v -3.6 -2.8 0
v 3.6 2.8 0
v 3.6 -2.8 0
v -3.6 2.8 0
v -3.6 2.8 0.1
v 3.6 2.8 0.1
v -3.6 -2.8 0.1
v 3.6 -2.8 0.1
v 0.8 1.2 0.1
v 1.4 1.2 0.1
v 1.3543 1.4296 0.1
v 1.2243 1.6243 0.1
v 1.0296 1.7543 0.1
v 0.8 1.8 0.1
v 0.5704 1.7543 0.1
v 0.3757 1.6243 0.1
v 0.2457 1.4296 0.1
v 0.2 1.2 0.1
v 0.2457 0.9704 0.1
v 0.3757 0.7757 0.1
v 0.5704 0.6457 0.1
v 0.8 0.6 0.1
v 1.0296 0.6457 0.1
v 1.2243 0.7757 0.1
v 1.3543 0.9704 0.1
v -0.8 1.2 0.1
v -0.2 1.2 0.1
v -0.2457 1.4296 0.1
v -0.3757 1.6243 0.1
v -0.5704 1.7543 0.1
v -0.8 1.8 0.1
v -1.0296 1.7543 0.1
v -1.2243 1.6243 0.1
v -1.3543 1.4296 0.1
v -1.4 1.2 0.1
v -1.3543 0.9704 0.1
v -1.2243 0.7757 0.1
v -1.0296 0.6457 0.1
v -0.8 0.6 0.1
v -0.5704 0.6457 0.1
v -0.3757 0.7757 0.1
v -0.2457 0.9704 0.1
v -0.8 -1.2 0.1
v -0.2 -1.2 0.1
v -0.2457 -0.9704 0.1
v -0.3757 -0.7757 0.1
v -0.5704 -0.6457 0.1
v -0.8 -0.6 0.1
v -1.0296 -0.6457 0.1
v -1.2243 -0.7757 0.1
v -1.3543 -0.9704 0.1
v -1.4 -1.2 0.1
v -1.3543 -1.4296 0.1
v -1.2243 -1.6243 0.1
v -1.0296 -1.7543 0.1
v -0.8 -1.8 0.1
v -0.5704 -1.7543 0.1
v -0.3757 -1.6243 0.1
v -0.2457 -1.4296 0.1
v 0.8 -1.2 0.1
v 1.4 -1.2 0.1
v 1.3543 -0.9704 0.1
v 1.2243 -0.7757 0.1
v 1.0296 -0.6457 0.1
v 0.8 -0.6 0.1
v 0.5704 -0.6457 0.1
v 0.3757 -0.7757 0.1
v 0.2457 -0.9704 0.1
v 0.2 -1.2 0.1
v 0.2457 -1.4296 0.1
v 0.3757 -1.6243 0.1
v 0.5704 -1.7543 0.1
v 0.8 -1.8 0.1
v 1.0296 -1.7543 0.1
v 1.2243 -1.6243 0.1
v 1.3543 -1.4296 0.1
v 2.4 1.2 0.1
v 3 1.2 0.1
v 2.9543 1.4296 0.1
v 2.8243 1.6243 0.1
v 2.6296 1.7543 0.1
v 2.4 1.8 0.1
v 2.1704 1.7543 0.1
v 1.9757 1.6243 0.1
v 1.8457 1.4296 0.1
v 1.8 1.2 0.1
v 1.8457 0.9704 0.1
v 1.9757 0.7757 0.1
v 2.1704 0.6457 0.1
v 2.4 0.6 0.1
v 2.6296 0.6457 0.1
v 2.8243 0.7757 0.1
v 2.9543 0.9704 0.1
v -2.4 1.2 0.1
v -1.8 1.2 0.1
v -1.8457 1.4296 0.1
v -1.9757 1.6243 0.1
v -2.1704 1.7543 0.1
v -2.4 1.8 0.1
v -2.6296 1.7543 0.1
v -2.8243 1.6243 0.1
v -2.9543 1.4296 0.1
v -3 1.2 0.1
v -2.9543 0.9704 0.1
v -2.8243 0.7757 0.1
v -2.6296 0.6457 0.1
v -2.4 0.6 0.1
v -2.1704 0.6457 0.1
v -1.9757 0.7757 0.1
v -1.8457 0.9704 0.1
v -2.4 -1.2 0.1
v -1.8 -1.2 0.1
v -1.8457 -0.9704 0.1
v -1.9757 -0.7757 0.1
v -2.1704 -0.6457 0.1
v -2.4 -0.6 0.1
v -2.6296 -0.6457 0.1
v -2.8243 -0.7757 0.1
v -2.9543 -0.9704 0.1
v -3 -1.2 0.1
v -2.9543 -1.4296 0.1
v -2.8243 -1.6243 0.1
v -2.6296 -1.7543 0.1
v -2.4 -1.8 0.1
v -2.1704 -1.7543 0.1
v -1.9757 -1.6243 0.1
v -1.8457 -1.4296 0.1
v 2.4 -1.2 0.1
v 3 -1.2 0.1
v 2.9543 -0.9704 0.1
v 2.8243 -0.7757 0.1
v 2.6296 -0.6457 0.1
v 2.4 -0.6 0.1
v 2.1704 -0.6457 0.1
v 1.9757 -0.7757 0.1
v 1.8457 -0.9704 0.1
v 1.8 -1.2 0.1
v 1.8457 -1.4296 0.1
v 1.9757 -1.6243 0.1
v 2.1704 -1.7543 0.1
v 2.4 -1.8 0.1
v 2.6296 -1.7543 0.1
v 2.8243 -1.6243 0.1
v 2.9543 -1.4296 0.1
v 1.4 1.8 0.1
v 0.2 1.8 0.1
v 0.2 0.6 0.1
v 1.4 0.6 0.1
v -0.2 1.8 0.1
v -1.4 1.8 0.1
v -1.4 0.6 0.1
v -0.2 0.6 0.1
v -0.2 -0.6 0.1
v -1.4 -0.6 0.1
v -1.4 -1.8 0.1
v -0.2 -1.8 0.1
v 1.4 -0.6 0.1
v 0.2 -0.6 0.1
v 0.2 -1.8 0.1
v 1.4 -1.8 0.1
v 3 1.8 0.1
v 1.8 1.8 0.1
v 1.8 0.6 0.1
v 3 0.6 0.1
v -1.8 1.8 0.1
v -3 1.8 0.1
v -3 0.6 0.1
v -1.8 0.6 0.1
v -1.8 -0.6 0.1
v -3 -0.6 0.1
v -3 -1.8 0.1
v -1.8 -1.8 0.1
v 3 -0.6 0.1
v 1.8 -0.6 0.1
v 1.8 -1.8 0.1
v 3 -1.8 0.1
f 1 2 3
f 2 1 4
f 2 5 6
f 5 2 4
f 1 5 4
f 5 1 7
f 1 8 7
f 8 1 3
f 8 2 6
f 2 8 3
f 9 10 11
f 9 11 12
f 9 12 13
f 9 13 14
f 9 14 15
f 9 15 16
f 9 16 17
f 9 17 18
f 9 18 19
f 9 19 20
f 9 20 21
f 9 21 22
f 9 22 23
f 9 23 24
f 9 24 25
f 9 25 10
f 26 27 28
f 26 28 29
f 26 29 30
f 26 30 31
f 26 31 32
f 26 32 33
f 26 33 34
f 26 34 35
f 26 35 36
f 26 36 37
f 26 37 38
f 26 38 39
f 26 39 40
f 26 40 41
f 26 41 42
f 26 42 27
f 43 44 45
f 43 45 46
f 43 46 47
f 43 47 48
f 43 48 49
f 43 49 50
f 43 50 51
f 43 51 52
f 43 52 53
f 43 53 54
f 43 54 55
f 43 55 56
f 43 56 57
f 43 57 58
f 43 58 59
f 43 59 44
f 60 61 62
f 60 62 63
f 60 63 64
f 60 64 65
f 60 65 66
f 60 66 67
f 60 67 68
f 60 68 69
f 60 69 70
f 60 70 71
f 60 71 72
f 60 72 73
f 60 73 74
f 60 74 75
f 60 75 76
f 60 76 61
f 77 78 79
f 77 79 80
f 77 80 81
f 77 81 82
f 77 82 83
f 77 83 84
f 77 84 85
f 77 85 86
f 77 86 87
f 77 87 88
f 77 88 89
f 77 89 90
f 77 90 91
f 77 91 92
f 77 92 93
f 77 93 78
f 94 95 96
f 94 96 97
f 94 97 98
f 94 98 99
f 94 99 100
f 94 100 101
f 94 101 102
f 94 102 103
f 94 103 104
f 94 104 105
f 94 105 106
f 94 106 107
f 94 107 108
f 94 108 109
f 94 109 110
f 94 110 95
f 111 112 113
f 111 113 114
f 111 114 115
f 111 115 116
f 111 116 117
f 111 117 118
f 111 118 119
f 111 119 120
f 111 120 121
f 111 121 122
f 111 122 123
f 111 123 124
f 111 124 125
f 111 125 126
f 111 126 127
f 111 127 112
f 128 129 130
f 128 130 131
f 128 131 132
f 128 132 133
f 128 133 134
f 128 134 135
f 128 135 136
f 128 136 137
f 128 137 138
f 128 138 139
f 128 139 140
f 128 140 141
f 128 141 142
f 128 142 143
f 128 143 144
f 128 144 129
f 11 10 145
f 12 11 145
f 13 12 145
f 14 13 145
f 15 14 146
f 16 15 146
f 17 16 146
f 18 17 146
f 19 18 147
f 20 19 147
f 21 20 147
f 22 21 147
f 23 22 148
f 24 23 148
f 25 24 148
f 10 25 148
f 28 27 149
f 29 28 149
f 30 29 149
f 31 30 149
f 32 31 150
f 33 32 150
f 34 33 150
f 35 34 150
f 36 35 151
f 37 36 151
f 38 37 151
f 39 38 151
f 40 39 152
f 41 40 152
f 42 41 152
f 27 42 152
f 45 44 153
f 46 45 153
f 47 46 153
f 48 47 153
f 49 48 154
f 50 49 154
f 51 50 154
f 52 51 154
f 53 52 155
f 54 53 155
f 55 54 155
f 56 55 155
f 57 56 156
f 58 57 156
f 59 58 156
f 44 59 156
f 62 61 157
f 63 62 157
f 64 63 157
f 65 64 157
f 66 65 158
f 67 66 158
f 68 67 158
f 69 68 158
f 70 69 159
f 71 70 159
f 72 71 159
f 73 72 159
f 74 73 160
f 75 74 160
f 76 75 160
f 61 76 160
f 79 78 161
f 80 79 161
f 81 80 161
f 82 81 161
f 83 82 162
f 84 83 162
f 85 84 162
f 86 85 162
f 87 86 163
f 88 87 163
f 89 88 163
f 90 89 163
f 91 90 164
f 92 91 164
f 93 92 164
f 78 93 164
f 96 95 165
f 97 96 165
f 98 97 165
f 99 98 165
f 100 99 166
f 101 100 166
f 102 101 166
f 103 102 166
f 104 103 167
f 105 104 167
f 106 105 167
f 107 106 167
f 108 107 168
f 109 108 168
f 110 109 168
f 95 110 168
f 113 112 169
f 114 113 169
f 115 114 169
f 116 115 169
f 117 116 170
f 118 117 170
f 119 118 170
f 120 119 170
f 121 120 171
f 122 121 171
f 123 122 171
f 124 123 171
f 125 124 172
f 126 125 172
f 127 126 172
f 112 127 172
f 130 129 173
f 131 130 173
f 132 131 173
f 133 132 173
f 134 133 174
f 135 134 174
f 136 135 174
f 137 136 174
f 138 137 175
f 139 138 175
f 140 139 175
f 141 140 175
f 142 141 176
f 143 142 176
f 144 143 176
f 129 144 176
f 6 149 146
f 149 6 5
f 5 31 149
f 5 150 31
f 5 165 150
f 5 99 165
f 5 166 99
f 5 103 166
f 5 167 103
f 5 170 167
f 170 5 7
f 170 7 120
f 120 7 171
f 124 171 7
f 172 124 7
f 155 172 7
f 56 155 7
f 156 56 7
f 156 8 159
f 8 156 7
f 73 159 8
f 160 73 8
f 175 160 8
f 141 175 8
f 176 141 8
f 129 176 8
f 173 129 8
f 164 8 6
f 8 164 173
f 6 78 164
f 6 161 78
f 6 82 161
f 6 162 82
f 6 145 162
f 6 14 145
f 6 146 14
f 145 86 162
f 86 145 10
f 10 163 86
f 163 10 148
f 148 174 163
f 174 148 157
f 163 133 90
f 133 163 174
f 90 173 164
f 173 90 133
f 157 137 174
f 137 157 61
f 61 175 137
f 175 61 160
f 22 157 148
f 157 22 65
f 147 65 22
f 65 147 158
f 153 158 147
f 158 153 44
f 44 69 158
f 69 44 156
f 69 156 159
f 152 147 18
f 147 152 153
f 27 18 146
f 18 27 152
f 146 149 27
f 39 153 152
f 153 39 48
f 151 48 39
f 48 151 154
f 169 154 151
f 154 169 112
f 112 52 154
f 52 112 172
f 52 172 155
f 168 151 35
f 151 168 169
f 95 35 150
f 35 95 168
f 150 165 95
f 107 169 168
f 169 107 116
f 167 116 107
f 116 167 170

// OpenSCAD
// file: ../p/box5-12.scad
use <../lib.scad>
function ldraw_lib__box5_12() = [
// 0 Box with 5 Faces without Any Edges
// 0 Name: box5-12.dat
// 0 Author: Chris Dee [cwdee]
// 0 !LDRAW_ORG Primitive UPDATE 2009-02
// 0 !LICENSE Licensed under CC BY 4.0 : see CAreadme.txt
// 
// 0 BFC CERTIFY CCW
  [0,"BFC","CERTIFY"],
  [0,"BFC","CCW"],
// 
// 0 !HISTORY 2009-09-03 [PTadmin] Official Update 2009-02
// 
// 
// 4 16 1 1 1 1 1 -1 -1 1 -1 -1 1 1
  [4,16,1,1,1,1,1,-1,-1,1,-1,-1,1,1],
// 4 16 -1 0 1 1 0 1 1 1 1 -1 1 1
  [4,16,-1,0,1,1,0,1,1,1,1,-1,1,1],
// 4 16 -1 0 -1 -1 0 1 -1 1 1 -1 1 -1
  [4,16,-1,0,-1,-1,0,1,-1,1,1,-1,1,-1],
// 4 16 1 0 -1 -1 0 -1 -1 1 -1 1 1 -1
  [4,16,1,0,-1,-1,0,-1,-1,1,-1,1,1,-1],
// 4 16 1 0 1 1 0 -1 1 1 -1 1 1 1
  [4,16,1,0,1,1,0,-1,1,1,-1,1,1,1],
// 0
];
module ldraw_lib__box5_12(step=0, col=false, unit=2/5, alt=false, line=0.2, solid=!$preview)
    makepoly(ldraw_lib__box5_12(), step=step, col=col, unit=unit, alt=alt, line=line, solid=solid);
ldraw_lib__box5_12(line=0.2);
// file: ../p/4-4ndis.scad
use <../lib.scad>
function ldraw_lib__4_4ndis() = [
// 0 Disc Negative 1.0
// 0 Name: 4-4ndis.dat
// 0 Author: James Jessiman
// 0 !LDRAW_ORG Primitive UPDATE 2012-01
// 0 !LICENSE Licensed under CC BY 4.0 : see CAreadme.txt
// 
// 0 BFC CERTIFY CCW
  [0,"BFC","CERTIFY"],
  [0,"BFC","CCW"],
// 
// 0 !HISTORY 2002-03-23 [sbliss] Added BFC statement; compacted code
// 0 !HISTORY 2002-04-25 [PTadmin] Official Update 2002-02
// 0 !HISTORY 2007-06-24 [PTadmin] Header formatted for Contributor Agreement
// 0 !HISTORY 2008-07-01 [PTadmin] Official Update 2008-01
// 0 !HISTORY 2012-02-16 [Philo] Changed to CCW
// 0 !HISTORY 2012-03-30 [PTadmin] Official Update 2012-01
// 
// 
// 3 16 0.9239 0 0.3827 1 0 0 1 0 1
  [3,16,0.9239,0,0.3827,1,0,0,1,0,1],
// 3 16 0.7071 0 0.7071 0.9239 0 0.3827 1 0 1
  [3,16,0.7071,0,0.7071,0.9239,0,0.3827,1,0,1],
// 3 16 0.3827 0 0.9239 0.7071 0 0.7071 1 0 1
  [3,16,0.3827,0,0.9239,0.7071,0,0.7071,1,0,1],
// 3 16 0 0 1 0.3827 0 0.9239 1 0 1
  [3,16,0,0,1,0.3827,0,0.9239,1,0,1],
// 3 16 -0.3827 0 0.9239 0 0 1 -1 0 1
  [3,16,-0.3827,0,0.9239,0,0,1,-1,0,1],
// 3 16 -0.7071 0 0.7071 -0.3827 0 0.9239 -1 0 1
  [3,16,-0.7071,0,0.7071,-0.3827,0,0.9239,-1,0,1],
// 3 16 -0.9239 0 0.3827 -0.7071 0 0.7071 -1 0 1
  [3,16,-0.9239,0,0.3827,-0.7071,0,0.7071,-1,0,1],
// 3 16 -1 0 0 -0.9239 0 0.3827 -1 0 1
  [3,16,-1,0,0,-0.9239,0,0.3827,-1,0,1],
// 3 16 -0.9239 0 -0.3827 -1 0 0 -1 0 -1
  [3,16,-0.9239,0,-0.3827,-1,0,0,-1,0,-1],
// 3 16 -0.7071 0 -0.7071 -0.9239 0 -0.3827 -1 0 -1
  [3,16,-0.7071,0,-0.7071,-0.9239,0,-0.3827,-1,0,-1],
// 3 16 -0.3827 0 -0.9239 -0.7071 0 -0.7071 -1 0 -1
  [3,16,-0.3827,0,-0.9239,-0.7071,0,-0.7071,-1,0,-1],
// 3 16 0 0 -1 -0.3827 0 -0.9239 -1 0 -1
  [3,16,0,0,-1,-0.3827,0,-0.9239,-1,0,-1],
// 3 16 0.3827 0 -0.9239 0 0 -1 1 0 -1
  [3,16,0.3827,0,-0.9239,0,0,-1,1,0,-1],
// 3 16 0.7071 0 -0.7071 0.3827 0 -0.9239 1 0 -1
  [3,16,0.7071,0,-0.7071,0.3827,0,-0.9239,1,0,-1],
// 3 16 0.9239 0 -0.3827 0.7071 0 -0.7071 1 0 -1
  [3,16,0.9239,0,-0.3827,0.7071,0,-0.7071,1,0,-1],
// 3 16 1 0 0 0.9239 0 -0.3827 1 0 -1
  [3,16,1,0,0,0.9239,0,-0.3827,1,0,-1],
];
module ldraw_lib__4_4ndis(step=0, col=false, unit=2/5, alt=false, line=0.2, solid=!$preview)
    makepoly(ldraw_lib__4_4ndis(), step=step, col=col, unit=unit, alt=alt, line=line, solid=solid);
ldraw_lib__4_4ndis(line=0.2);
// file: ../p/4-4disc.scad
use <../lib.scad>
function ldraw_lib__4_4disc() = [
// 0 Disc 1.0
// 0 Name: 4-4disc.dat
// 0 Author: James Jessiman
// 0 !LDRAW_ORG Primitive UPDATE 2002-02
// 0 !LICENSE Licensed under CC BY 4.0 : see CAreadme.txt
// 
// 0 BFC CERTIFY CCW
  [0,"BFC","CERTIFY"],
  [0,"BFC","CCW"],
// 
// 0 !HISTORY 1998-12-15 [PTadmin] Official Update 1998-10
// 0 !HISTORY 2002-03-23 [sbliss] Added BFC statement
// 0 !HISTORY 2002-04-25 [PTadmin] Official Update 2002-02
// 0 !HISTORY 2007-06-24 [PTadmin] Header formatted for Contributor Agreement
// 0 !HISTORY 2008-07-01 [PTadmin] Official Update 2008-01
// 
// 
// 3 16 0 0 0 1 0 0 0.9239 0 0.3827
  [3,16,0,0,0,1,0,0,0.9239,0,0.3827],
// 3 16 0 0 0 0.9239 0 0.3827 0.7071 0 0.7071
  [3,16,0,0,0,0.9239,0,0.3827,0.7071,0,0.7071],
// 3 16 0 0 0 0.7071 0 0.7071 0.3827 0 0.9239
  [3,16,0,0,0,0.7071,0,0.7071,0.3827,0,0.9239],
// 3 16 0 0 0 0.3827 0 0.9239 0 0 1
  [3,16,0,0,0,0.3827,0,0.9239,0,0,1],
// 3 16 0 0 0 0 0 1 -0.3827 0 0.9239
  [3,16,0,0,0,0,0,1,-0.3827,0,0.9239],
// 3 16 0 0 0 -0.3827 0 0.9239 -0.7071 0 0.7071
  [3,16,0,0,0,-0.3827,0,0.9239,-0.7071,0,0.7071],
// 3 16 0 0 0 -0.7071 0 0.7071 -0.9239 0 0.3827
  [3,16,0,0,0,-0.7071,0,0.7071,-0.9239,0,0.3827],
// 3 16 0 0 0 -0.9239 0 0.3827 -1 0 -0
  [3,16,0,0,0,-0.9239,0,0.3827,-1,0,-0],
// 3 16 0 0 0 -1 0 -0 -0.9239 0 -0.3827
  [3,16,0,0,0,-1,0,-0,-0.9239,0,-0.3827],
// 3 16 0 0 0 -0.9239 0 -0.3827 -0.7071 0 -0.7071
  [3,16,0,0,0,-0.9239,0,-0.3827,-0.7071,0,-0.7071],
// 3 16 0 0 0 -0.7071 0 -0.7071 -0.3827 0 -0.9239
  [3,16,0,0,0,-0.7071,0,-0.7071,-0.3827,0,-0.9239],
// 3 16 0 0 0 -0.3827 0 -0.9239 0 0 -1
  [3,16,0,0,0,-0.3827,0,-0.9239,0,0,-1],
// 3 16 0 0 0 0 0 -1 0.3827 0 -0.9239
  [3,16,0,0,0,0,0,-1,0.3827,0,-0.9239],
// 3 16 0 0 0 0.3827 0 -0.9239 0.7071 0 -0.7071
  [3,16,0,0,0,0.3827,0,-0.9239,0.7071,0,-0.7071],
// 3 16 0 0 0 0.7071 0 -0.7071 0.9239 0 -0.3827
  [3,16,0,0,0,0.7071,0,-0.7071,0.9239,0,-0.3827],
// 3 16 0 0 0 0.9239 0 -0.3827 1 0 0
  [3,16,0,0,0,0.9239,0,-0.3827,1,0,0],
// 0
];
module ldraw_lib__4_4disc(step=0, col=false, unit=2/5, alt=false, line=0.2, solid=!$preview)
    makepoly(ldraw_lib__4_4disc(), step=step, col=col, unit=unit, alt=alt, line=line, solid=solid);
ldraw_lib__4_4disc(line=0.2);
// main file
use <../lib.scad>
use <../p/4-4disc.scad>
use <../p/4-4ndis.scad>
use <../p/box5-12.scad>
function ldraw_lib__196235d() = [
// 0 Sticker  0.7 x  0.9 with Eight White Dots on Black Background
// 0 Name: 196235d.dat
// 0 Author: Takeshi Takahashi [RainbowDolphin]
// 0 !LDRAW_ORG Part UPDATE 2022-02
// 0 !LICENSE Licensed under CC BY 4.0 : see CAreadme.txt
// 
// 0 BFC CERTIFY CCW
  [0,"BFC","CERTIFY"],
  [0,"BFC","CCW"],
// 
// 0 !KEYWORDS Set 6695, shell, tanker
// 
// 0 !HISTORY 2022-03-06 [PTadmin] Official Update 2022-02
// 
// 
// 1 16 0 -0.25 0 9 0 0 0 0.25 0 0 0 7 box5-12.dat
  [1,16,0,-0.25,0,9,0,0,0,0.25,0,0,0,7, ldraw_lib__box5_12()],
// 1 15 2 -0.25 3 1.5 0 0 0 1 0 0 0 1.5 4-4disc.dat
  [1,15,2,-0.25,3,1.5,0,0,0,1,0,0,0,1.5, ldraw_lib__4_4disc()],
// 1 15 -2 -0.25 3 1.5 0 0 0 1 0 0 0 1.5 4-4disc.dat
  [1,15,-2,-0.25,3,1.5,0,0,0,1,0,0,0,1.5, ldraw_lib__4_4disc()],
// 1 15 -2 -0.25 -3 1.5 0 0 0 1 0 0 0 1.5 4-4disc.dat
  [1,15,-2,-0.25,-3,1.5,0,0,0,1,0,0,0,1.5, ldraw_lib__4_4disc()],
// 1 15 2 -0.25 -3 1.5 0 0 0 1 0 0 0 1.5 4-4disc.dat
  [1,15,2,-0.25,-3,1.5,0,0,0,1,0,0,0,1.5, ldraw_lib__4_4disc()],
// 1 15 6 -0.25 3 1.5 0 0 0 1 0 0 0 1.5 4-4disc.dat
  [1,15,6,-0.25,3,1.5,0,0,0,1,0,0,0,1.5, ldraw_lib__4_4disc()],
// 1 15 -6 -0.25 3 1.5 0 0 0 1 0 0 0 1.5 4-4disc.dat
  [1,15,-6,-0.25,3,1.5,0,0,0,1,0,0,0,1.5, ldraw_lib__4_4disc()],
// 1 15 -6 -0.25 -3 1.5 0 0 0 1 0 0 0 1.5 4-4disc.dat
  [1,15,-6,-0.25,-3,1.5,0,0,0,1,0,0,0,1.5, ldraw_lib__4_4disc()],
// 1 15 6 -0.25 -3 1.5 0 0 0 1 0 0 0 1.5 4-4disc.dat
  [1,15,6,-0.25,-3,1.5,0,0,0,1,0,0,0,1.5, ldraw_lib__4_4disc()],
// 1 0 2 -0.25 3 1.5 0 0 0 1 0 0 0 1.5 4-4ndis.dat
  [1,0,2,-0.25,3,1.5,0,0,0,1,0,0,0,1.5, ldraw_lib__4_4ndis()],
// 1 0 -2 -0.25 3 1.5 0 0 0 1 0 0 0 1.5 4-4ndis.dat
  [1,0,-2,-0.25,3,1.5,0,0,0,1,0,0,0,1.5, ldraw_lib__4_4ndis()],
// 1 0 -2 -0.25 -3 1.5 0 0 0 1 0 0 0 1.5 4-4ndis.dat
  [1,0,-2,-0.25,-3,1.5,0,0,0,1,0,0,0,1.5, ldraw_lib__4_4ndis()],
// 1 0 2 -0.25 -3 1.5 0 0 0 1 0 0 0 1.5 4-4ndis.dat
  [1,0,2,-0.25,-3,1.5,0,0,0,1,0,0,0,1.5, ldraw_lib__4_4ndis()],
// 1 0 6 -0.25 3 1.5 0 0 0 1 0 0 0 1.5 4-4ndis.dat
  [1,0,6,-0.25,3,1.5,0,0,0,1,0,0,0,1.5, ldraw_lib__4_4ndis()],
// 1 0 -6 -0.25 3 1.5 0 0 0 1 0 0 0 1.5 4-4ndis.dat
  [1,0,-6,-0.25,3,1.5,0,0,0,1,0,0,0,1.5, ldraw_lib__4_4ndis()],
// 1 0 -6 -0.25 -3 1.5 0 0 0 1 0 0 0 1.5 4-4ndis.dat
  [1,0,-6,-0.25,-3,1.5,0,0,0,1,0,0,0,1.5, ldraw_lib__4_4ndis()],
// 1 0 6 -0.25 -3 1.5 0 0 0 1 0 0 0 1.5 4-4ndis.dat
  [1,0,6,-0.25,-3,1.5,0,0,0,1,0,0,0,1.5, ldraw_lib__4_4ndis()],
// 4 0 0.5 -0.25 4.5 9 -0.25 7 -9 -0.25 7 -0.5 -0.25 4.5
  [4,0,0.5,-0.25,4.5,9,-0.25,7,-9,-0.25,7,-0.5,-0.25,4.5],
// 3 0 -9 -0.25 7 -2 -0.25 4.5 -0.5 -0.25 4.5
  [3,0,-9,-0.25,7,-2,-0.25,4.5,-0.5,-0.25,4.5],
// 3 0 -9 -0.25 7 -3.5 -0.25 4.5 -2 -0.25 4.5
  [3,0,-9,-0.25,7,-3.5,-0.25,4.5,-2,-0.25,4.5],
// 3 0 -9 -0.25 7 -4.5 -0.25 4.5 -3.5 -0.25 4.5
  [3,0,-9,-0.25,7,-4.5,-0.25,4.5,-3.5,-0.25,4.5],
// 3 0 -9 -0.25 7 -6 -0.25 4.5 -4.5 -0.25 4.5
  [3,0,-9,-0.25,7,-6,-0.25,4.5,-4.5,-0.25,4.5],
// 3 0 -9 -0.25 7 -7.5 -0.25 4.5 -6 -0.25 4.5
  [3,0,-9,-0.25,7,-7.5,-0.25,4.5,-6,-0.25,4.5],
// 3 0 -9 -0.25 7 -7.5 -0.25 3 -7.5 -0.25 4.5
  [3,0,-9,-0.25,7,-7.5,-0.25,3,-7.5,-0.25,4.5],
// 3 0 -9 -0.25 7 -7.5 -0.25 1.5 -7.5 -0.25 3
  [3,0,-9,-0.25,7,-7.5,-0.25,1.5,-7.5,-0.25,3],
// 4 0 -7.5 -0.25 -1.5 -7.5 -0.25 1.5 -9 -0.25 7 -9 -0.25 -7
  [4,0,-7.5,-0.25,-1.5,-7.5,-0.25,1.5,-9,-0.25,7,-9,-0.25,-7],
// 3 0 -7.5 -0.25 -1.5 -9 -0.25 -7 -7.5 -0.25 -3
  [3,0,-7.5,-0.25,-1.5,-9,-0.25,-7,-7.5,-0.25,-3],
// 3 0 -7.5 -0.25 -3 -9 -0.25 -7 -7.5 -0.25 -4.5
  [3,0,-7.5,-0.25,-3,-9,-0.25,-7,-7.5,-0.25,-4.5],
// 3 0 -6 -0.25 -4.5 -7.5 -0.25 -4.5 -9 -0.25 -7
  [3,0,-6,-0.25,-4.5,-7.5,-0.25,-4.5,-9,-0.25,-7],
// 3 0 -4.5 -0.25 -4.5 -6 -0.25 -4.5 -9 -0.25 -7
  [3,0,-4.5,-0.25,-4.5,-6,-0.25,-4.5,-9,-0.25,-7],
// 3 0 -3.5 -0.25 -4.5 -4.5 -0.25 -4.5 -9 -0.25 -7
  [3,0,-3.5,-0.25,-4.5,-4.5,-0.25,-4.5,-9,-0.25,-7],
// 3 0 -2 -0.25 -4.5 -3.5 -0.25 -4.5 -9 -0.25 -7
  [3,0,-2,-0.25,-4.5,-3.5,-0.25,-4.5,-9,-0.25,-7],
// 3 0 -0.5 -0.25 -4.5 -2 -0.25 -4.5 -9 -0.25 -7
  [3,0,-0.5,-0.25,-4.5,-2,-0.25,-4.5,-9,-0.25,-7],
// 4 0 0.5 -0.25 -4.5 -0.5 -0.25 -4.5 -9 -0.25 -7 9 -0.25 -7
  [4,0,0.5,-0.25,-4.5,-0.5,-0.25,-4.5,-9,-0.25,-7,9,-0.25,-7],
// 3 0 2 -0.25 -4.5 0.5 -0.25 -4.5 9 -0.25 -7
  [3,0,2,-0.25,-4.5,0.5,-0.25,-4.5,9,-0.25,-7],
// 3 0 3.5 -0.25 -4.5 2 -0.25 -4.5 9 -0.25 -7
  [3,0,3.5,-0.25,-4.5,2,-0.25,-4.5,9,-0.25,-7],
// 3 0 4.5 -0.25 -4.5 3.5 -0.25 -4.5 9 -0.25 -7
  [3,0,4.5,-0.25,-4.5,3.5,-0.25,-4.5,9,-0.25,-7],
// 3 0 6 -0.25 -4.5 4.5 -0.25 -4.5 9 -0.25 -7
  [3,0,6,-0.25,-4.5,4.5,-0.25,-4.5,9,-0.25,-7],
// 3 0 7.5 -0.25 -4.5 6 -0.25 -4.5 9 -0.25 -7
  [3,0,7.5,-0.25,-4.5,6,-0.25,-4.5,9,-0.25,-7],
// 3 0 7.5 -0.25 -3 7.5 -0.25 -4.5 9 -0.25 -7
  [3,0,7.5,-0.25,-3,7.5,-0.25,-4.5,9,-0.25,-7],
// 3 0 7.5 -0.25 -1.5 7.5 -0.25 -3 9 -0.25 -7
  [3,0,7.5,-0.25,-1.5,7.5,-0.25,-3,9,-0.25,-7],
// 4 0 7.5 -0.25 1.5 7.5 -0.25 -1.5 9 -0.25 -7 9 -0.25 7
  [4,0,7.5,-0.25,1.5,7.5,-0.25,-1.5,9,-0.25,-7,9,-0.25,7],
// 3 0 9 -0.25 7 7.5 -0.25 3 7.5 -0.25 1.5
  [3,0,9,-0.25,7,7.5,-0.25,3,7.5,-0.25,1.5],
// 3 0 9 -0.25 7 7.5 -0.25 4.5 7.5 -0.25 3
  [3,0,9,-0.25,7,7.5,-0.25,4.5,7.5,-0.25,3],
// 3 0 9 -0.25 7 6 -0.25 4.5 7.5 -0.25 4.5
  [3,0,9,-0.25,7,6,-0.25,4.5,7.5,-0.25,4.5],
// 3 0 9 -0.25 7 4.5 -0.25 4.5 6 -0.25 4.5
  [3,0,9,-0.25,7,4.5,-0.25,4.5,6,-0.25,4.5],
// 3 0 9 -0.25 7 3.5 -0.25 4.5 4.5 -0.25 4.5
  [3,0,9,-0.25,7,3.5,-0.25,4.5,4.5,-0.25,4.5],
// 3 0 9 -0.25 7 2 -0.25 4.5 3.5 -0.25 4.5
  [3,0,9,-0.25,7,2,-0.25,4.5,3.5,-0.25,4.5],
// 3 0 9 -0.25 7 0.5 -0.25 4.5 2 -0.25 4.5
  [3,0,9,-0.25,7,0.5,-0.25,4.5,2,-0.25,4.5],
// 4 0 4.5 -0.25 4.5 3.5 -0.25 4.5 3.5 -0.25 3 4.5 -0.25 3
  [4,0,4.5,-0.25,4.5,3.5,-0.25,4.5,3.5,-0.25,3,4.5,-0.25,3],
// 4 0 4.5 -0.25 3 3.5 -0.25 3 3.5 -0.25 1.5 4.5 -0.25 1.5
  [4,0,4.5,-0.25,3,3.5,-0.25,3,3.5,-0.25,1.5,4.5,-0.25,1.5],
// 4 0 4.5 -0.25 1.5 3.5 -0.25 1.5 3.5 -0.25 -1.5 4.5 -0.25 -1.5
  [4,0,4.5,-0.25,1.5,3.5,-0.25,1.5,3.5,-0.25,-1.5,4.5,-0.25,-1.5],
// 4 0 6 -0.25 1.5 4.5 -0.25 1.5 4.5 -0.25 -1.5 6 -0.25 -1.5
  [4,0,6,-0.25,1.5,4.5,-0.25,1.5,4.5,-0.25,-1.5,6,-0.25,-1.5],
// 4 0 7.5 -0.25 1.5 6 -0.25 1.5 6 -0.25 -1.5 7.5 -0.25 -1.5
  [4,0,7.5,-0.25,1.5,6,-0.25,1.5,6,-0.25,-1.5,7.5,-0.25,-1.5],
// 4 0 4.5 -0.25 -1.5 3.5 -0.25 -1.5 3.5 -0.25 -3 4.5 -0.25 -3
  [4,0,4.5,-0.25,-1.5,3.5,-0.25,-1.5,3.5,-0.25,-3,4.5,-0.25,-3],
// 4 0 4.5 -0.25 -3 3.5 -0.25 -3 3.5 -0.25 -4.5 4.5 -0.25 -4.5
  [4,0,4.5,-0.25,-3,3.5,-0.25,-3,3.5,-0.25,-4.5,4.5,-0.25,-4.5],
// 4 0 2 -0.25 -1.5 3.5 -0.25 -1.5 3.5 -0.25 1.5 2 -0.25 1.5
  [4,0,2,-0.25,-1.5,3.5,-0.25,-1.5,3.5,-0.25,1.5,2,-0.25,1.5],
// 4 0 0.5 -0.25 -1.5 2 -0.25 -1.5 2 -0.25 1.5 0.5 -0.25 1.5
  [4,0,0.5,-0.25,-1.5,2,-0.25,-1.5,2,-0.25,1.5,0.5,-0.25,1.5],
// 4 0 0.5 -0.25 -1.5 0.5 -0.25 1.5 -0.5 -0.25 -1.5 -0.5 -0.25 -3
  [4,0,0.5,-0.25,-1.5,0.5,-0.25,1.5,-0.5,-0.25,-1.5,-0.5,-0.25,-3],
// 4 0 0.5 -0.25 -3 0.5 -0.25 -1.5 -0.5 -0.25 -3 -0.5 -0.25 -4.5
  [4,0,0.5,-0.25,-3,0.5,-0.25,-1.5,-0.5,-0.25,-3,-0.5,-0.25,-4.5],
// 3 0 0.5 -0.25 -3 -0.5 -0.25 -4.5 0.5 -0.25 -4.5
  [3,0,0.5,-0.25,-3,-0.5,-0.25,-4.5,0.5,-0.25,-4.5],
// 4 0 -0.5 -0.25 1.5 -0.5 -0.25 -1.5 0.5 -0.25 1.5 0.5 -0.25 3
  [4,0,-0.5,-0.25,1.5,-0.5,-0.25,-1.5,0.5,-0.25,1.5,0.5,-0.25,3],
// 4 0 -0.5 -0.25 3 -0.5 -0.25 1.5 0.5 -0.25 3 0.5 -0.25 4.5
  [4,0,-0.5,-0.25,3,-0.5,-0.25,1.5,0.5,-0.25,3,0.5,-0.25,4.5],
// 3 0 0.5 -0.25 4.5 -0.5 -0.25 4.5 -0.5 -0.25 3
  [3,0,0.5,-0.25,4.5,-0.5,-0.25,4.5,-0.5,-0.25,3],
// 4 0 -2 -0.25 -1.5 -0.5 -0.25 -1.5 -0.5 -0.25 1.5 -2 -0.25 1.5
  [4,0,-2,-0.25,-1.5,-0.5,-0.25,-1.5,-0.5,-0.25,1.5,-2,-0.25,1.5],
// 4 0 -3.5 -0.25 -1.5 -2 -0.25 -1.5 -2 -0.25 1.5 -3.5 -0.25 1.5
  [4,0,-3.5,-0.25,-1.5,-2,-0.25,-1.5,-2,-0.25,1.5,-3.5,-0.25,1.5],
// 4 0 -3.5 -0.25 -1.5 -3.5 -0.25 1.5 -4.5 -0.25 -1.5 -4.5 -0.25 -3
  [4,0,-3.5,-0.25,-1.5,-3.5,-0.25,1.5,-4.5,-0.25,-1.5,-4.5,-0.25,-3],
// 4 0 -3.5 -0.25 -3 -3.5 -0.25 -1.5 -4.5 -0.25 -3 -4.5 -0.25 -4.5
  [4,0,-3.5,-0.25,-3,-3.5,-0.25,-1.5,-4.5,-0.25,-3,-4.5,-0.25,-4.5],
// 3 0 -3.5 -0.25 -3 -4.5 -0.25 -4.5 -3.5 -0.25 -4.5
  [3,0,-3.5,-0.25,-3,-4.5,-0.25,-4.5,-3.5,-0.25,-4.5],
// 4 0 -4.5 -0.25 1.5 -4.5 -0.25 -1.5 -3.5 -0.25 1.5 -3.5 -0.25 3
  [4,0,-4.5,-0.25,1.5,-4.5,-0.25,-1.5,-3.5,-0.25,1.5,-3.5,-0.25,3],
// 4 0 -4.5 -0.25 3 -4.5 -0.25 1.5 -3.5 -0.25 3 -3.5 -0.25 4.5
  [4,0,-4.5,-0.25,3,-4.5,-0.25,1.5,-3.5,-0.25,3,-3.5,-0.25,4.5],
// 3 0 -3.5 -0.25 4.5 -4.5 -0.25 4.5 -4.5 -0.25 3
  [3,0,-3.5,-0.25,4.5,-4.5,-0.25,4.5,-4.5,-0.25,3],
// 4 0 -6 -0.25 -1.5 -4.5 -0.25 -1.5 -4.5 -0.25 1.5 -6 -0.25 1.5
  [4,0,-6,-0.25,-1.5,-4.5,-0.25,-1.5,-4.5,-0.25,1.5,-6,-0.25,1.5],
// 4 0 -7.5 -0.25 -1.5 -6 -0.25 -1.5 -6 -0.25 1.5 -7.5 -0.25 1.5
  [4,0,-7.5,-0.25,-1.5,-6,-0.25,-1.5,-6,-0.25,1.5,-7.5,-0.25,1.5],
];
module ldraw_lib__196235d(step=0, col=false, unit=2/5, alt=false, line=0.2, solid=!$preview)
    makepoly(ldraw_lib__196235d(), step=step, col=col, unit=unit, alt=alt, line=line, solid=solid);
ldraw_lib__196235d(line=0.2);
